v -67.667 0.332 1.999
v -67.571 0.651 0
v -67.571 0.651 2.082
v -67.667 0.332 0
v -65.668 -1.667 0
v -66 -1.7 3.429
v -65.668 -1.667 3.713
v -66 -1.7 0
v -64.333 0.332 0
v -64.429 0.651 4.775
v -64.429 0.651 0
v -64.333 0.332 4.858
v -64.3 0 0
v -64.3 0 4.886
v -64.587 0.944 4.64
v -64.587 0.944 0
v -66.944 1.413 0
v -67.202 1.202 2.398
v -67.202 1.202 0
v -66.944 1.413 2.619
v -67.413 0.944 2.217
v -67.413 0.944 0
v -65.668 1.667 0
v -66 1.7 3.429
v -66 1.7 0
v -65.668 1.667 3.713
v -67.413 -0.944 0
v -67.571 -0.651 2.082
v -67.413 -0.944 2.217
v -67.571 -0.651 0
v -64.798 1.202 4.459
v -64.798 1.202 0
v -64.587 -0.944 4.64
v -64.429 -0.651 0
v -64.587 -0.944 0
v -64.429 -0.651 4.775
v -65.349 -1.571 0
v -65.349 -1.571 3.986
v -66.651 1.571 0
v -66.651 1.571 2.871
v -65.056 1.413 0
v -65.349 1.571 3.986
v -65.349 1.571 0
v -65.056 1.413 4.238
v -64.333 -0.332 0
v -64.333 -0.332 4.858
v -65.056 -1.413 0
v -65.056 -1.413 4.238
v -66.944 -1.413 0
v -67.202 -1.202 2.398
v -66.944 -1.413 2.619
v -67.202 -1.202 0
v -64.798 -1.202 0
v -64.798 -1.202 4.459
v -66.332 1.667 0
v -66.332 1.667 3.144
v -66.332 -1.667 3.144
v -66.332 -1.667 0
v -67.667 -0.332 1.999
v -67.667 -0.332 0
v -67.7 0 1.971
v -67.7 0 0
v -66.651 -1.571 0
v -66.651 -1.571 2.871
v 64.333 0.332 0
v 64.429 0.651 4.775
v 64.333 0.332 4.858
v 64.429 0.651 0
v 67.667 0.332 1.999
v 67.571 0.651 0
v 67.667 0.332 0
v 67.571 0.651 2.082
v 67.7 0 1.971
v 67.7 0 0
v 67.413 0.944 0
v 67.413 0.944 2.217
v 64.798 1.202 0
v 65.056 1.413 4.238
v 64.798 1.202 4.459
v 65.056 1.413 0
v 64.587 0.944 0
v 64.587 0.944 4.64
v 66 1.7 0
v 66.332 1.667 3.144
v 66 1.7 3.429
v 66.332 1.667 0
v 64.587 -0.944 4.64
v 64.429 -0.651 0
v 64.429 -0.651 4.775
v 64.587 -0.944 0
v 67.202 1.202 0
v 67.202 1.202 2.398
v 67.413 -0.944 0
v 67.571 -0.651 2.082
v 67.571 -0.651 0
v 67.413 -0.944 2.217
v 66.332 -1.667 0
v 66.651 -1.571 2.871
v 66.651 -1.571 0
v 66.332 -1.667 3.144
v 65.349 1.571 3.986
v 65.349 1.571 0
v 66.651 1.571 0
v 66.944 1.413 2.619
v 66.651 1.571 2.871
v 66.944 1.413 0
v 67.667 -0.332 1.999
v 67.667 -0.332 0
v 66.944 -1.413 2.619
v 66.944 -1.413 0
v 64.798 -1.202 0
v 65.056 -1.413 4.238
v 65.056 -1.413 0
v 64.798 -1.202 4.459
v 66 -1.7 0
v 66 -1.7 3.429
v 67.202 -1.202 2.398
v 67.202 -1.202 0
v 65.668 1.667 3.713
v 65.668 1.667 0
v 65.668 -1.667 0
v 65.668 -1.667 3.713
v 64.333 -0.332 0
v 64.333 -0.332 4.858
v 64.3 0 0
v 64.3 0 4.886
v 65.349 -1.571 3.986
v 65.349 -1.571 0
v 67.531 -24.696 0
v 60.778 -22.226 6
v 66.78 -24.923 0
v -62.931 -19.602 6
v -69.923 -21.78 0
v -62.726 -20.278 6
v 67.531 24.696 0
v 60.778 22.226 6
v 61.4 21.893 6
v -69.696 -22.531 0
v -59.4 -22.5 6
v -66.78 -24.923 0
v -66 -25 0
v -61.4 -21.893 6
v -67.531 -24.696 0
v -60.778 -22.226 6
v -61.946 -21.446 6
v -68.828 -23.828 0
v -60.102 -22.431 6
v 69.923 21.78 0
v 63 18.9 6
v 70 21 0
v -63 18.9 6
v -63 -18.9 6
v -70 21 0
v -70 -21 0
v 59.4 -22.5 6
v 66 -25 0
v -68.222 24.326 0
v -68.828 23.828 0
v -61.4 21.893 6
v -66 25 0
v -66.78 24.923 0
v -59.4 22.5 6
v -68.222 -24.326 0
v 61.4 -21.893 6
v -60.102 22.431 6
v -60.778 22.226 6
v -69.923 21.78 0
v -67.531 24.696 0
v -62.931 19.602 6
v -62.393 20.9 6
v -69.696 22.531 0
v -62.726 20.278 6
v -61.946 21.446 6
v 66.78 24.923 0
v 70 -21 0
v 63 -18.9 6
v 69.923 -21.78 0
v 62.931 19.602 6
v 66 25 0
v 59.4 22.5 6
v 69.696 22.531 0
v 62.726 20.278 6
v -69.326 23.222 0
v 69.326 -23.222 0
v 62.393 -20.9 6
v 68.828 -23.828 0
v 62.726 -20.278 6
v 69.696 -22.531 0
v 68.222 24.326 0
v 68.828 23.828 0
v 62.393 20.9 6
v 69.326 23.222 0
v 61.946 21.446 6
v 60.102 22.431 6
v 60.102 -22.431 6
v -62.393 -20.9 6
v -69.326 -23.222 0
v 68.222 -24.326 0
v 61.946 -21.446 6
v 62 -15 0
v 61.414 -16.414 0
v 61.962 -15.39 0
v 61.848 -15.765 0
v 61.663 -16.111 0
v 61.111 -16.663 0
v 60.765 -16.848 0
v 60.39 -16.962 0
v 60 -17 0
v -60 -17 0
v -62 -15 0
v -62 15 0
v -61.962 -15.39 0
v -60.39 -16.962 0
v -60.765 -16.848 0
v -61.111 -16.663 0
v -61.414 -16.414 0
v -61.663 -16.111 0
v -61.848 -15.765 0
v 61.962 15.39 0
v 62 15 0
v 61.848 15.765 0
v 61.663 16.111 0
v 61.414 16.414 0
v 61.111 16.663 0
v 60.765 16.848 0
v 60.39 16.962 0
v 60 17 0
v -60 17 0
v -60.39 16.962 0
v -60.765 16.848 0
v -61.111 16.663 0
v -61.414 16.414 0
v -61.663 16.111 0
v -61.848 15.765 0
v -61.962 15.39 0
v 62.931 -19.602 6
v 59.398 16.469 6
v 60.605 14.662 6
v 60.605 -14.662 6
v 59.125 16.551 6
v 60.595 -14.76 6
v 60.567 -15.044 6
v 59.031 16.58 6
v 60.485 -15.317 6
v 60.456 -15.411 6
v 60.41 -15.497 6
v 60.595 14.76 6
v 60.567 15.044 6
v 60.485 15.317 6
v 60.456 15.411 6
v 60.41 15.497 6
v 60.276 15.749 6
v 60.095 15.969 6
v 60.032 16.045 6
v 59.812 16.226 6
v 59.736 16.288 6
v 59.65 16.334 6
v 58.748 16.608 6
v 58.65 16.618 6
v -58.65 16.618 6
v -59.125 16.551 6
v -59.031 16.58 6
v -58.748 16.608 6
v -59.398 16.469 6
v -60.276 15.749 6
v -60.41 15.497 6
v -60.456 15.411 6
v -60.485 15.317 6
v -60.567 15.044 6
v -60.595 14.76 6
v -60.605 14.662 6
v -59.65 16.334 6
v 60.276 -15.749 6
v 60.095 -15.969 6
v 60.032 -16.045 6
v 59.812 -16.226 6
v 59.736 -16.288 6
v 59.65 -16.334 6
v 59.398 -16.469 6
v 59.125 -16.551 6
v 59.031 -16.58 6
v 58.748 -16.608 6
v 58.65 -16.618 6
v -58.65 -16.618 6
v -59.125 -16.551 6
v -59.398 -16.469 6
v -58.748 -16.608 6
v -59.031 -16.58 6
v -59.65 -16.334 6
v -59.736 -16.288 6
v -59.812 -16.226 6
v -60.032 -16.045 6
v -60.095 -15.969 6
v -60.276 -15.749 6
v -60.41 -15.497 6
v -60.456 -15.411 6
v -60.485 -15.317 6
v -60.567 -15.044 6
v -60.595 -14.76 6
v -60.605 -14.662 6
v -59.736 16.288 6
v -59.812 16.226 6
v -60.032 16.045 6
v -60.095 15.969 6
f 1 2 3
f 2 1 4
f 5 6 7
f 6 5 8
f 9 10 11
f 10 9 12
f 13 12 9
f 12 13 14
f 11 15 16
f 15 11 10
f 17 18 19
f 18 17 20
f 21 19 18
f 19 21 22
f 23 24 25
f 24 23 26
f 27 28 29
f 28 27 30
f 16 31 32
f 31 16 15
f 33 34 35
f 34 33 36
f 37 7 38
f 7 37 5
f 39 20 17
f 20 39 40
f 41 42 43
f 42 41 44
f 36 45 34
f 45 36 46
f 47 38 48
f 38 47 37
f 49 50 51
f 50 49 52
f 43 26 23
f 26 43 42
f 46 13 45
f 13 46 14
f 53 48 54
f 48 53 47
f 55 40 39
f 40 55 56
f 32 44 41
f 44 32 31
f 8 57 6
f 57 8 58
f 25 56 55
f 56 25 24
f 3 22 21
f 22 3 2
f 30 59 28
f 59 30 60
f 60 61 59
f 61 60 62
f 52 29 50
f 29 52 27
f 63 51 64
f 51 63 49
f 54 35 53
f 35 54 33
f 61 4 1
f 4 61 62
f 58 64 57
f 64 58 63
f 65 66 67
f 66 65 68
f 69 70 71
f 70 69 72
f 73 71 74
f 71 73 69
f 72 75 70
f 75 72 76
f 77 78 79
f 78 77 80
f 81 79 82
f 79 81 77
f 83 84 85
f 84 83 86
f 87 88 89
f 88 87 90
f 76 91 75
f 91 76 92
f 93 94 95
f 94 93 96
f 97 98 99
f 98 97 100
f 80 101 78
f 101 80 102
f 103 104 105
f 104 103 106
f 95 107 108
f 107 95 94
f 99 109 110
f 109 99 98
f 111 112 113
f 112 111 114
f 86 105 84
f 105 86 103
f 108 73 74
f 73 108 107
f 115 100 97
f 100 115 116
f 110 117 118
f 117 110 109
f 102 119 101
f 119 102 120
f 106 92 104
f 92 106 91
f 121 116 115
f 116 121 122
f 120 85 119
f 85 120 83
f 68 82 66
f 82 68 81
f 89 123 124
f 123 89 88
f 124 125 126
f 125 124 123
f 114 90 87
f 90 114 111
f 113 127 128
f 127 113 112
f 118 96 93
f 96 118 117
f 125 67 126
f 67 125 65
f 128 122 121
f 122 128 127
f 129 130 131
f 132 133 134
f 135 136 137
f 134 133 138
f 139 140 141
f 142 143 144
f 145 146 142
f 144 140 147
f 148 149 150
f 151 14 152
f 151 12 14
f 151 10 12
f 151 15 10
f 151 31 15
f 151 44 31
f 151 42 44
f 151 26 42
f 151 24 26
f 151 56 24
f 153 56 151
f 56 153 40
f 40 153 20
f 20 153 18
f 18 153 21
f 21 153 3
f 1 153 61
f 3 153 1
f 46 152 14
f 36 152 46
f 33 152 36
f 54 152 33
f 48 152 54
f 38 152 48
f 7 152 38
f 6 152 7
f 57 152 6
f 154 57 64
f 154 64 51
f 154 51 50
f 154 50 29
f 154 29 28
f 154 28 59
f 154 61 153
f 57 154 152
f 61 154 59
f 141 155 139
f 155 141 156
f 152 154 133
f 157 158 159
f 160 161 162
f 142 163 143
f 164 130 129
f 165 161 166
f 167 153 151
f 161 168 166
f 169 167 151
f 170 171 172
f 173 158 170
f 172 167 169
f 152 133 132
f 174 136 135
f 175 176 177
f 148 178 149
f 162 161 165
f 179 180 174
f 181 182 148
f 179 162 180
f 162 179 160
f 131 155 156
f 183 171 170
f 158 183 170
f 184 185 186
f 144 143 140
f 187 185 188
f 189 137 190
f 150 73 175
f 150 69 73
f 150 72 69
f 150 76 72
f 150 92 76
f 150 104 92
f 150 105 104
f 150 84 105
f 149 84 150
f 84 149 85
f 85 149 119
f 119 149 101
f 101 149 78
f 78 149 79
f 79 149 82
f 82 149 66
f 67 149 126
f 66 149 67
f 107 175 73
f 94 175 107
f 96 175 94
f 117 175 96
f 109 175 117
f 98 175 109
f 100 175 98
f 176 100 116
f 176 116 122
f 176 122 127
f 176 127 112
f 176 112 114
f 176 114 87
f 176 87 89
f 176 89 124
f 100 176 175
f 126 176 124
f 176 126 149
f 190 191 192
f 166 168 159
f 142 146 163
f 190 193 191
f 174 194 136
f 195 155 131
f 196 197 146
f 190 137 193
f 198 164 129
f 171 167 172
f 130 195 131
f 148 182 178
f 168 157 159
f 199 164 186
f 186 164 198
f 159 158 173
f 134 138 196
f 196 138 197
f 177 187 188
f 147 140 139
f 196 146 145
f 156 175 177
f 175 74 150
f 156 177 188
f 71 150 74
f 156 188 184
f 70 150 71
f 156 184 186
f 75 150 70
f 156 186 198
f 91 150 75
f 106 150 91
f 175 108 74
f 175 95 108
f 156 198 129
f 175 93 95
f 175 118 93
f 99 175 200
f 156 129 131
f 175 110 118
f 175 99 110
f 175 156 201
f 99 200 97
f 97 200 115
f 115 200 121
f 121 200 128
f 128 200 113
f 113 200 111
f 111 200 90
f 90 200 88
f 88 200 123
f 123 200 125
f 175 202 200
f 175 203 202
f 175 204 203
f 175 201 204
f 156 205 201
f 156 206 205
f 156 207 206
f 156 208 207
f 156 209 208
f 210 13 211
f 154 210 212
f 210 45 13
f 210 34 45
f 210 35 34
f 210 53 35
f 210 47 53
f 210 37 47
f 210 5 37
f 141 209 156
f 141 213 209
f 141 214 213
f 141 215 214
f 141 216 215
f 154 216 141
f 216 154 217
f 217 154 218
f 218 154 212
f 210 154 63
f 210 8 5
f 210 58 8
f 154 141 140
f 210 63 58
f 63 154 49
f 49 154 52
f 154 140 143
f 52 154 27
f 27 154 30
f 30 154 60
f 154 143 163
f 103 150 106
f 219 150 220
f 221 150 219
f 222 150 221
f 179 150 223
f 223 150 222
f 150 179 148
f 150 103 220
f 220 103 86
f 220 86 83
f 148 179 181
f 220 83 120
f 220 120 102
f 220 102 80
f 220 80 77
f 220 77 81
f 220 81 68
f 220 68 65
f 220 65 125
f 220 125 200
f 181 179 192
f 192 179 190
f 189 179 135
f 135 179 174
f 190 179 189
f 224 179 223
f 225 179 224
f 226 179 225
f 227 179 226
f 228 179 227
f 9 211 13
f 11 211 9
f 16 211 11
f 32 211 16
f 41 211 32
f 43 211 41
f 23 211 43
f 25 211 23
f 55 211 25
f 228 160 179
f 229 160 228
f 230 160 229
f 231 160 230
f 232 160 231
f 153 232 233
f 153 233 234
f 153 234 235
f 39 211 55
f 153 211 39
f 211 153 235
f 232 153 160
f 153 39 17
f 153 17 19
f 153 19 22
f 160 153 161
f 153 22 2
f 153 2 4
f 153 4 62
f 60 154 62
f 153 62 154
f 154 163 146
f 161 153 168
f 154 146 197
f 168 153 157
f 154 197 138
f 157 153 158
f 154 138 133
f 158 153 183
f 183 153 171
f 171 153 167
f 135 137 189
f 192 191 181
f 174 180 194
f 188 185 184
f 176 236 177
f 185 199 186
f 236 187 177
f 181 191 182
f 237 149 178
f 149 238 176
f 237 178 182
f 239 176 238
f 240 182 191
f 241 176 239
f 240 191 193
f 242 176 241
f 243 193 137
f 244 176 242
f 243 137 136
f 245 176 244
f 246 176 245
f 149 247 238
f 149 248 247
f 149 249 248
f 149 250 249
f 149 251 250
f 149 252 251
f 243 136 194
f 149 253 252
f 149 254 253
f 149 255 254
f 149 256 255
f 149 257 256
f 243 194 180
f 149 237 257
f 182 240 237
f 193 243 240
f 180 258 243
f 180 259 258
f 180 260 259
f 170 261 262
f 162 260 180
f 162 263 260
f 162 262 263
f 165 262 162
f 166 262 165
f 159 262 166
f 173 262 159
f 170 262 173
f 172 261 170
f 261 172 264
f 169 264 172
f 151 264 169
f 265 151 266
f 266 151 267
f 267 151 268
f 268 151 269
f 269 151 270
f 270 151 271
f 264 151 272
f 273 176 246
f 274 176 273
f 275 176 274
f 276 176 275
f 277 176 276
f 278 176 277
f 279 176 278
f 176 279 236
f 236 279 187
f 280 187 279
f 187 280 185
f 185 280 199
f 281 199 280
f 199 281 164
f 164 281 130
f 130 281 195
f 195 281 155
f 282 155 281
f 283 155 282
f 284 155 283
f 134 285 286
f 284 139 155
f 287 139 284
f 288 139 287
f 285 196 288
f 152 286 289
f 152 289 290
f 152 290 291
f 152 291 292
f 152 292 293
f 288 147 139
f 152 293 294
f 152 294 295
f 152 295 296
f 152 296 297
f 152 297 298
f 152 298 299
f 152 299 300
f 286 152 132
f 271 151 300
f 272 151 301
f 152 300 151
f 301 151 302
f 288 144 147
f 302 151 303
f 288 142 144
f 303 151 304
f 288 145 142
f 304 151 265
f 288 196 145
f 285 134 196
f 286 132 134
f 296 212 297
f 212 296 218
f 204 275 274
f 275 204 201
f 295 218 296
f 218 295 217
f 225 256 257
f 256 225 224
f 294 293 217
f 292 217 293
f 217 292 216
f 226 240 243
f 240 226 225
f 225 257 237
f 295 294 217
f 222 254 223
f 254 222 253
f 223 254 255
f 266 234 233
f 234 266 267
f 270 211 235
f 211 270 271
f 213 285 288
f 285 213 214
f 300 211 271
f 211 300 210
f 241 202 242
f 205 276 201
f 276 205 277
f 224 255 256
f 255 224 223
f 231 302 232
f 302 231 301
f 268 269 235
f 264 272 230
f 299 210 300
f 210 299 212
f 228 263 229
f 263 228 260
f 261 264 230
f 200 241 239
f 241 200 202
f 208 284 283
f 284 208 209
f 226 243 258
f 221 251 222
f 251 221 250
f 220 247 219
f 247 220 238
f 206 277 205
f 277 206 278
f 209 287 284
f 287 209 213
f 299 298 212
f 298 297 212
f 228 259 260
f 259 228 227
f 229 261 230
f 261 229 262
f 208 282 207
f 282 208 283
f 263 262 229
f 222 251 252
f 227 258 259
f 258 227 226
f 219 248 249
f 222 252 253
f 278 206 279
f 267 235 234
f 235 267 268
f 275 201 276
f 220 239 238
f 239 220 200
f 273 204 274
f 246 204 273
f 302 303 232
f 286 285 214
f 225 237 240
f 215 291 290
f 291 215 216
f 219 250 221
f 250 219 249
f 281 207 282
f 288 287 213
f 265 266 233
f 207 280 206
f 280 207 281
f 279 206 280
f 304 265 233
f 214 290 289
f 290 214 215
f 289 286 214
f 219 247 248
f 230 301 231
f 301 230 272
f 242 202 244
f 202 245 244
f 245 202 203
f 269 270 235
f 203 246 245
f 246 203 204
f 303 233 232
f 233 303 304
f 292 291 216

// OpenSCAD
$fn = 32;

// ----------------------------------------------------------------------
// Display bezel: 140 x 50 mm frame, opening 124x34 mm
// ----------------------------------------------------------------------

// --- parameters (mm) ---
length = 140;             // frame outside length, X
width = 50;               // frame outside width, Y
frame_w = 8;              // frame width
thickness = 6;            // frame thickness
corner_r = 4;             // outside corner radius
chamfer = 0.9;            // outer wall taper
funnel = 0.97;            // inner opening taper
opening_l = 124;          // opening length
opening_w = 34;           // opening width
inner_r = 2;              // opening corner radius
hole_d = 3.4;             // mounting screw clearance
holes_per_side = 1;       // holes per short side
hole_inset = 4;           // hole centre inset from the outside edge

/* rounded-rectangle outlines, generated with loops */
module rounded_ring(l_nom, w_nom, r) {
  hull() {
    for (sx = [-1, 1]) for (sy = [-1, 1])
      translate([sx * (l_nom / 2 - r), sy * (w_nom / 2 - r)]) circle(r = r);
  }
}

difference() {
  /* frame body, drafted so the outer edge is a variable-depth chamfer */
  linear_extrude(height = thickness, scale = chamfer)
    rounded_ring(length, width, corner_r);
  /* viewing opening, drafted the other way for a funnel edge */
  linear_extrude(height = thickness + 2, scale = funnel)
    translate([0, 0, -1]) rounded_ring(opening_l, opening_w, inner_r);
  /* mounting screws through the frame lands */
  for (sx = [-1, 1]) for (i = [1 : holes_per_side])
    translate([sx * (length / 2 - hole_inset),
               (i - (holes_per_side + 1) / 2) * width * 0.5, -1])
      cylinder(h = thickness + 2, d = hole_d);
}
